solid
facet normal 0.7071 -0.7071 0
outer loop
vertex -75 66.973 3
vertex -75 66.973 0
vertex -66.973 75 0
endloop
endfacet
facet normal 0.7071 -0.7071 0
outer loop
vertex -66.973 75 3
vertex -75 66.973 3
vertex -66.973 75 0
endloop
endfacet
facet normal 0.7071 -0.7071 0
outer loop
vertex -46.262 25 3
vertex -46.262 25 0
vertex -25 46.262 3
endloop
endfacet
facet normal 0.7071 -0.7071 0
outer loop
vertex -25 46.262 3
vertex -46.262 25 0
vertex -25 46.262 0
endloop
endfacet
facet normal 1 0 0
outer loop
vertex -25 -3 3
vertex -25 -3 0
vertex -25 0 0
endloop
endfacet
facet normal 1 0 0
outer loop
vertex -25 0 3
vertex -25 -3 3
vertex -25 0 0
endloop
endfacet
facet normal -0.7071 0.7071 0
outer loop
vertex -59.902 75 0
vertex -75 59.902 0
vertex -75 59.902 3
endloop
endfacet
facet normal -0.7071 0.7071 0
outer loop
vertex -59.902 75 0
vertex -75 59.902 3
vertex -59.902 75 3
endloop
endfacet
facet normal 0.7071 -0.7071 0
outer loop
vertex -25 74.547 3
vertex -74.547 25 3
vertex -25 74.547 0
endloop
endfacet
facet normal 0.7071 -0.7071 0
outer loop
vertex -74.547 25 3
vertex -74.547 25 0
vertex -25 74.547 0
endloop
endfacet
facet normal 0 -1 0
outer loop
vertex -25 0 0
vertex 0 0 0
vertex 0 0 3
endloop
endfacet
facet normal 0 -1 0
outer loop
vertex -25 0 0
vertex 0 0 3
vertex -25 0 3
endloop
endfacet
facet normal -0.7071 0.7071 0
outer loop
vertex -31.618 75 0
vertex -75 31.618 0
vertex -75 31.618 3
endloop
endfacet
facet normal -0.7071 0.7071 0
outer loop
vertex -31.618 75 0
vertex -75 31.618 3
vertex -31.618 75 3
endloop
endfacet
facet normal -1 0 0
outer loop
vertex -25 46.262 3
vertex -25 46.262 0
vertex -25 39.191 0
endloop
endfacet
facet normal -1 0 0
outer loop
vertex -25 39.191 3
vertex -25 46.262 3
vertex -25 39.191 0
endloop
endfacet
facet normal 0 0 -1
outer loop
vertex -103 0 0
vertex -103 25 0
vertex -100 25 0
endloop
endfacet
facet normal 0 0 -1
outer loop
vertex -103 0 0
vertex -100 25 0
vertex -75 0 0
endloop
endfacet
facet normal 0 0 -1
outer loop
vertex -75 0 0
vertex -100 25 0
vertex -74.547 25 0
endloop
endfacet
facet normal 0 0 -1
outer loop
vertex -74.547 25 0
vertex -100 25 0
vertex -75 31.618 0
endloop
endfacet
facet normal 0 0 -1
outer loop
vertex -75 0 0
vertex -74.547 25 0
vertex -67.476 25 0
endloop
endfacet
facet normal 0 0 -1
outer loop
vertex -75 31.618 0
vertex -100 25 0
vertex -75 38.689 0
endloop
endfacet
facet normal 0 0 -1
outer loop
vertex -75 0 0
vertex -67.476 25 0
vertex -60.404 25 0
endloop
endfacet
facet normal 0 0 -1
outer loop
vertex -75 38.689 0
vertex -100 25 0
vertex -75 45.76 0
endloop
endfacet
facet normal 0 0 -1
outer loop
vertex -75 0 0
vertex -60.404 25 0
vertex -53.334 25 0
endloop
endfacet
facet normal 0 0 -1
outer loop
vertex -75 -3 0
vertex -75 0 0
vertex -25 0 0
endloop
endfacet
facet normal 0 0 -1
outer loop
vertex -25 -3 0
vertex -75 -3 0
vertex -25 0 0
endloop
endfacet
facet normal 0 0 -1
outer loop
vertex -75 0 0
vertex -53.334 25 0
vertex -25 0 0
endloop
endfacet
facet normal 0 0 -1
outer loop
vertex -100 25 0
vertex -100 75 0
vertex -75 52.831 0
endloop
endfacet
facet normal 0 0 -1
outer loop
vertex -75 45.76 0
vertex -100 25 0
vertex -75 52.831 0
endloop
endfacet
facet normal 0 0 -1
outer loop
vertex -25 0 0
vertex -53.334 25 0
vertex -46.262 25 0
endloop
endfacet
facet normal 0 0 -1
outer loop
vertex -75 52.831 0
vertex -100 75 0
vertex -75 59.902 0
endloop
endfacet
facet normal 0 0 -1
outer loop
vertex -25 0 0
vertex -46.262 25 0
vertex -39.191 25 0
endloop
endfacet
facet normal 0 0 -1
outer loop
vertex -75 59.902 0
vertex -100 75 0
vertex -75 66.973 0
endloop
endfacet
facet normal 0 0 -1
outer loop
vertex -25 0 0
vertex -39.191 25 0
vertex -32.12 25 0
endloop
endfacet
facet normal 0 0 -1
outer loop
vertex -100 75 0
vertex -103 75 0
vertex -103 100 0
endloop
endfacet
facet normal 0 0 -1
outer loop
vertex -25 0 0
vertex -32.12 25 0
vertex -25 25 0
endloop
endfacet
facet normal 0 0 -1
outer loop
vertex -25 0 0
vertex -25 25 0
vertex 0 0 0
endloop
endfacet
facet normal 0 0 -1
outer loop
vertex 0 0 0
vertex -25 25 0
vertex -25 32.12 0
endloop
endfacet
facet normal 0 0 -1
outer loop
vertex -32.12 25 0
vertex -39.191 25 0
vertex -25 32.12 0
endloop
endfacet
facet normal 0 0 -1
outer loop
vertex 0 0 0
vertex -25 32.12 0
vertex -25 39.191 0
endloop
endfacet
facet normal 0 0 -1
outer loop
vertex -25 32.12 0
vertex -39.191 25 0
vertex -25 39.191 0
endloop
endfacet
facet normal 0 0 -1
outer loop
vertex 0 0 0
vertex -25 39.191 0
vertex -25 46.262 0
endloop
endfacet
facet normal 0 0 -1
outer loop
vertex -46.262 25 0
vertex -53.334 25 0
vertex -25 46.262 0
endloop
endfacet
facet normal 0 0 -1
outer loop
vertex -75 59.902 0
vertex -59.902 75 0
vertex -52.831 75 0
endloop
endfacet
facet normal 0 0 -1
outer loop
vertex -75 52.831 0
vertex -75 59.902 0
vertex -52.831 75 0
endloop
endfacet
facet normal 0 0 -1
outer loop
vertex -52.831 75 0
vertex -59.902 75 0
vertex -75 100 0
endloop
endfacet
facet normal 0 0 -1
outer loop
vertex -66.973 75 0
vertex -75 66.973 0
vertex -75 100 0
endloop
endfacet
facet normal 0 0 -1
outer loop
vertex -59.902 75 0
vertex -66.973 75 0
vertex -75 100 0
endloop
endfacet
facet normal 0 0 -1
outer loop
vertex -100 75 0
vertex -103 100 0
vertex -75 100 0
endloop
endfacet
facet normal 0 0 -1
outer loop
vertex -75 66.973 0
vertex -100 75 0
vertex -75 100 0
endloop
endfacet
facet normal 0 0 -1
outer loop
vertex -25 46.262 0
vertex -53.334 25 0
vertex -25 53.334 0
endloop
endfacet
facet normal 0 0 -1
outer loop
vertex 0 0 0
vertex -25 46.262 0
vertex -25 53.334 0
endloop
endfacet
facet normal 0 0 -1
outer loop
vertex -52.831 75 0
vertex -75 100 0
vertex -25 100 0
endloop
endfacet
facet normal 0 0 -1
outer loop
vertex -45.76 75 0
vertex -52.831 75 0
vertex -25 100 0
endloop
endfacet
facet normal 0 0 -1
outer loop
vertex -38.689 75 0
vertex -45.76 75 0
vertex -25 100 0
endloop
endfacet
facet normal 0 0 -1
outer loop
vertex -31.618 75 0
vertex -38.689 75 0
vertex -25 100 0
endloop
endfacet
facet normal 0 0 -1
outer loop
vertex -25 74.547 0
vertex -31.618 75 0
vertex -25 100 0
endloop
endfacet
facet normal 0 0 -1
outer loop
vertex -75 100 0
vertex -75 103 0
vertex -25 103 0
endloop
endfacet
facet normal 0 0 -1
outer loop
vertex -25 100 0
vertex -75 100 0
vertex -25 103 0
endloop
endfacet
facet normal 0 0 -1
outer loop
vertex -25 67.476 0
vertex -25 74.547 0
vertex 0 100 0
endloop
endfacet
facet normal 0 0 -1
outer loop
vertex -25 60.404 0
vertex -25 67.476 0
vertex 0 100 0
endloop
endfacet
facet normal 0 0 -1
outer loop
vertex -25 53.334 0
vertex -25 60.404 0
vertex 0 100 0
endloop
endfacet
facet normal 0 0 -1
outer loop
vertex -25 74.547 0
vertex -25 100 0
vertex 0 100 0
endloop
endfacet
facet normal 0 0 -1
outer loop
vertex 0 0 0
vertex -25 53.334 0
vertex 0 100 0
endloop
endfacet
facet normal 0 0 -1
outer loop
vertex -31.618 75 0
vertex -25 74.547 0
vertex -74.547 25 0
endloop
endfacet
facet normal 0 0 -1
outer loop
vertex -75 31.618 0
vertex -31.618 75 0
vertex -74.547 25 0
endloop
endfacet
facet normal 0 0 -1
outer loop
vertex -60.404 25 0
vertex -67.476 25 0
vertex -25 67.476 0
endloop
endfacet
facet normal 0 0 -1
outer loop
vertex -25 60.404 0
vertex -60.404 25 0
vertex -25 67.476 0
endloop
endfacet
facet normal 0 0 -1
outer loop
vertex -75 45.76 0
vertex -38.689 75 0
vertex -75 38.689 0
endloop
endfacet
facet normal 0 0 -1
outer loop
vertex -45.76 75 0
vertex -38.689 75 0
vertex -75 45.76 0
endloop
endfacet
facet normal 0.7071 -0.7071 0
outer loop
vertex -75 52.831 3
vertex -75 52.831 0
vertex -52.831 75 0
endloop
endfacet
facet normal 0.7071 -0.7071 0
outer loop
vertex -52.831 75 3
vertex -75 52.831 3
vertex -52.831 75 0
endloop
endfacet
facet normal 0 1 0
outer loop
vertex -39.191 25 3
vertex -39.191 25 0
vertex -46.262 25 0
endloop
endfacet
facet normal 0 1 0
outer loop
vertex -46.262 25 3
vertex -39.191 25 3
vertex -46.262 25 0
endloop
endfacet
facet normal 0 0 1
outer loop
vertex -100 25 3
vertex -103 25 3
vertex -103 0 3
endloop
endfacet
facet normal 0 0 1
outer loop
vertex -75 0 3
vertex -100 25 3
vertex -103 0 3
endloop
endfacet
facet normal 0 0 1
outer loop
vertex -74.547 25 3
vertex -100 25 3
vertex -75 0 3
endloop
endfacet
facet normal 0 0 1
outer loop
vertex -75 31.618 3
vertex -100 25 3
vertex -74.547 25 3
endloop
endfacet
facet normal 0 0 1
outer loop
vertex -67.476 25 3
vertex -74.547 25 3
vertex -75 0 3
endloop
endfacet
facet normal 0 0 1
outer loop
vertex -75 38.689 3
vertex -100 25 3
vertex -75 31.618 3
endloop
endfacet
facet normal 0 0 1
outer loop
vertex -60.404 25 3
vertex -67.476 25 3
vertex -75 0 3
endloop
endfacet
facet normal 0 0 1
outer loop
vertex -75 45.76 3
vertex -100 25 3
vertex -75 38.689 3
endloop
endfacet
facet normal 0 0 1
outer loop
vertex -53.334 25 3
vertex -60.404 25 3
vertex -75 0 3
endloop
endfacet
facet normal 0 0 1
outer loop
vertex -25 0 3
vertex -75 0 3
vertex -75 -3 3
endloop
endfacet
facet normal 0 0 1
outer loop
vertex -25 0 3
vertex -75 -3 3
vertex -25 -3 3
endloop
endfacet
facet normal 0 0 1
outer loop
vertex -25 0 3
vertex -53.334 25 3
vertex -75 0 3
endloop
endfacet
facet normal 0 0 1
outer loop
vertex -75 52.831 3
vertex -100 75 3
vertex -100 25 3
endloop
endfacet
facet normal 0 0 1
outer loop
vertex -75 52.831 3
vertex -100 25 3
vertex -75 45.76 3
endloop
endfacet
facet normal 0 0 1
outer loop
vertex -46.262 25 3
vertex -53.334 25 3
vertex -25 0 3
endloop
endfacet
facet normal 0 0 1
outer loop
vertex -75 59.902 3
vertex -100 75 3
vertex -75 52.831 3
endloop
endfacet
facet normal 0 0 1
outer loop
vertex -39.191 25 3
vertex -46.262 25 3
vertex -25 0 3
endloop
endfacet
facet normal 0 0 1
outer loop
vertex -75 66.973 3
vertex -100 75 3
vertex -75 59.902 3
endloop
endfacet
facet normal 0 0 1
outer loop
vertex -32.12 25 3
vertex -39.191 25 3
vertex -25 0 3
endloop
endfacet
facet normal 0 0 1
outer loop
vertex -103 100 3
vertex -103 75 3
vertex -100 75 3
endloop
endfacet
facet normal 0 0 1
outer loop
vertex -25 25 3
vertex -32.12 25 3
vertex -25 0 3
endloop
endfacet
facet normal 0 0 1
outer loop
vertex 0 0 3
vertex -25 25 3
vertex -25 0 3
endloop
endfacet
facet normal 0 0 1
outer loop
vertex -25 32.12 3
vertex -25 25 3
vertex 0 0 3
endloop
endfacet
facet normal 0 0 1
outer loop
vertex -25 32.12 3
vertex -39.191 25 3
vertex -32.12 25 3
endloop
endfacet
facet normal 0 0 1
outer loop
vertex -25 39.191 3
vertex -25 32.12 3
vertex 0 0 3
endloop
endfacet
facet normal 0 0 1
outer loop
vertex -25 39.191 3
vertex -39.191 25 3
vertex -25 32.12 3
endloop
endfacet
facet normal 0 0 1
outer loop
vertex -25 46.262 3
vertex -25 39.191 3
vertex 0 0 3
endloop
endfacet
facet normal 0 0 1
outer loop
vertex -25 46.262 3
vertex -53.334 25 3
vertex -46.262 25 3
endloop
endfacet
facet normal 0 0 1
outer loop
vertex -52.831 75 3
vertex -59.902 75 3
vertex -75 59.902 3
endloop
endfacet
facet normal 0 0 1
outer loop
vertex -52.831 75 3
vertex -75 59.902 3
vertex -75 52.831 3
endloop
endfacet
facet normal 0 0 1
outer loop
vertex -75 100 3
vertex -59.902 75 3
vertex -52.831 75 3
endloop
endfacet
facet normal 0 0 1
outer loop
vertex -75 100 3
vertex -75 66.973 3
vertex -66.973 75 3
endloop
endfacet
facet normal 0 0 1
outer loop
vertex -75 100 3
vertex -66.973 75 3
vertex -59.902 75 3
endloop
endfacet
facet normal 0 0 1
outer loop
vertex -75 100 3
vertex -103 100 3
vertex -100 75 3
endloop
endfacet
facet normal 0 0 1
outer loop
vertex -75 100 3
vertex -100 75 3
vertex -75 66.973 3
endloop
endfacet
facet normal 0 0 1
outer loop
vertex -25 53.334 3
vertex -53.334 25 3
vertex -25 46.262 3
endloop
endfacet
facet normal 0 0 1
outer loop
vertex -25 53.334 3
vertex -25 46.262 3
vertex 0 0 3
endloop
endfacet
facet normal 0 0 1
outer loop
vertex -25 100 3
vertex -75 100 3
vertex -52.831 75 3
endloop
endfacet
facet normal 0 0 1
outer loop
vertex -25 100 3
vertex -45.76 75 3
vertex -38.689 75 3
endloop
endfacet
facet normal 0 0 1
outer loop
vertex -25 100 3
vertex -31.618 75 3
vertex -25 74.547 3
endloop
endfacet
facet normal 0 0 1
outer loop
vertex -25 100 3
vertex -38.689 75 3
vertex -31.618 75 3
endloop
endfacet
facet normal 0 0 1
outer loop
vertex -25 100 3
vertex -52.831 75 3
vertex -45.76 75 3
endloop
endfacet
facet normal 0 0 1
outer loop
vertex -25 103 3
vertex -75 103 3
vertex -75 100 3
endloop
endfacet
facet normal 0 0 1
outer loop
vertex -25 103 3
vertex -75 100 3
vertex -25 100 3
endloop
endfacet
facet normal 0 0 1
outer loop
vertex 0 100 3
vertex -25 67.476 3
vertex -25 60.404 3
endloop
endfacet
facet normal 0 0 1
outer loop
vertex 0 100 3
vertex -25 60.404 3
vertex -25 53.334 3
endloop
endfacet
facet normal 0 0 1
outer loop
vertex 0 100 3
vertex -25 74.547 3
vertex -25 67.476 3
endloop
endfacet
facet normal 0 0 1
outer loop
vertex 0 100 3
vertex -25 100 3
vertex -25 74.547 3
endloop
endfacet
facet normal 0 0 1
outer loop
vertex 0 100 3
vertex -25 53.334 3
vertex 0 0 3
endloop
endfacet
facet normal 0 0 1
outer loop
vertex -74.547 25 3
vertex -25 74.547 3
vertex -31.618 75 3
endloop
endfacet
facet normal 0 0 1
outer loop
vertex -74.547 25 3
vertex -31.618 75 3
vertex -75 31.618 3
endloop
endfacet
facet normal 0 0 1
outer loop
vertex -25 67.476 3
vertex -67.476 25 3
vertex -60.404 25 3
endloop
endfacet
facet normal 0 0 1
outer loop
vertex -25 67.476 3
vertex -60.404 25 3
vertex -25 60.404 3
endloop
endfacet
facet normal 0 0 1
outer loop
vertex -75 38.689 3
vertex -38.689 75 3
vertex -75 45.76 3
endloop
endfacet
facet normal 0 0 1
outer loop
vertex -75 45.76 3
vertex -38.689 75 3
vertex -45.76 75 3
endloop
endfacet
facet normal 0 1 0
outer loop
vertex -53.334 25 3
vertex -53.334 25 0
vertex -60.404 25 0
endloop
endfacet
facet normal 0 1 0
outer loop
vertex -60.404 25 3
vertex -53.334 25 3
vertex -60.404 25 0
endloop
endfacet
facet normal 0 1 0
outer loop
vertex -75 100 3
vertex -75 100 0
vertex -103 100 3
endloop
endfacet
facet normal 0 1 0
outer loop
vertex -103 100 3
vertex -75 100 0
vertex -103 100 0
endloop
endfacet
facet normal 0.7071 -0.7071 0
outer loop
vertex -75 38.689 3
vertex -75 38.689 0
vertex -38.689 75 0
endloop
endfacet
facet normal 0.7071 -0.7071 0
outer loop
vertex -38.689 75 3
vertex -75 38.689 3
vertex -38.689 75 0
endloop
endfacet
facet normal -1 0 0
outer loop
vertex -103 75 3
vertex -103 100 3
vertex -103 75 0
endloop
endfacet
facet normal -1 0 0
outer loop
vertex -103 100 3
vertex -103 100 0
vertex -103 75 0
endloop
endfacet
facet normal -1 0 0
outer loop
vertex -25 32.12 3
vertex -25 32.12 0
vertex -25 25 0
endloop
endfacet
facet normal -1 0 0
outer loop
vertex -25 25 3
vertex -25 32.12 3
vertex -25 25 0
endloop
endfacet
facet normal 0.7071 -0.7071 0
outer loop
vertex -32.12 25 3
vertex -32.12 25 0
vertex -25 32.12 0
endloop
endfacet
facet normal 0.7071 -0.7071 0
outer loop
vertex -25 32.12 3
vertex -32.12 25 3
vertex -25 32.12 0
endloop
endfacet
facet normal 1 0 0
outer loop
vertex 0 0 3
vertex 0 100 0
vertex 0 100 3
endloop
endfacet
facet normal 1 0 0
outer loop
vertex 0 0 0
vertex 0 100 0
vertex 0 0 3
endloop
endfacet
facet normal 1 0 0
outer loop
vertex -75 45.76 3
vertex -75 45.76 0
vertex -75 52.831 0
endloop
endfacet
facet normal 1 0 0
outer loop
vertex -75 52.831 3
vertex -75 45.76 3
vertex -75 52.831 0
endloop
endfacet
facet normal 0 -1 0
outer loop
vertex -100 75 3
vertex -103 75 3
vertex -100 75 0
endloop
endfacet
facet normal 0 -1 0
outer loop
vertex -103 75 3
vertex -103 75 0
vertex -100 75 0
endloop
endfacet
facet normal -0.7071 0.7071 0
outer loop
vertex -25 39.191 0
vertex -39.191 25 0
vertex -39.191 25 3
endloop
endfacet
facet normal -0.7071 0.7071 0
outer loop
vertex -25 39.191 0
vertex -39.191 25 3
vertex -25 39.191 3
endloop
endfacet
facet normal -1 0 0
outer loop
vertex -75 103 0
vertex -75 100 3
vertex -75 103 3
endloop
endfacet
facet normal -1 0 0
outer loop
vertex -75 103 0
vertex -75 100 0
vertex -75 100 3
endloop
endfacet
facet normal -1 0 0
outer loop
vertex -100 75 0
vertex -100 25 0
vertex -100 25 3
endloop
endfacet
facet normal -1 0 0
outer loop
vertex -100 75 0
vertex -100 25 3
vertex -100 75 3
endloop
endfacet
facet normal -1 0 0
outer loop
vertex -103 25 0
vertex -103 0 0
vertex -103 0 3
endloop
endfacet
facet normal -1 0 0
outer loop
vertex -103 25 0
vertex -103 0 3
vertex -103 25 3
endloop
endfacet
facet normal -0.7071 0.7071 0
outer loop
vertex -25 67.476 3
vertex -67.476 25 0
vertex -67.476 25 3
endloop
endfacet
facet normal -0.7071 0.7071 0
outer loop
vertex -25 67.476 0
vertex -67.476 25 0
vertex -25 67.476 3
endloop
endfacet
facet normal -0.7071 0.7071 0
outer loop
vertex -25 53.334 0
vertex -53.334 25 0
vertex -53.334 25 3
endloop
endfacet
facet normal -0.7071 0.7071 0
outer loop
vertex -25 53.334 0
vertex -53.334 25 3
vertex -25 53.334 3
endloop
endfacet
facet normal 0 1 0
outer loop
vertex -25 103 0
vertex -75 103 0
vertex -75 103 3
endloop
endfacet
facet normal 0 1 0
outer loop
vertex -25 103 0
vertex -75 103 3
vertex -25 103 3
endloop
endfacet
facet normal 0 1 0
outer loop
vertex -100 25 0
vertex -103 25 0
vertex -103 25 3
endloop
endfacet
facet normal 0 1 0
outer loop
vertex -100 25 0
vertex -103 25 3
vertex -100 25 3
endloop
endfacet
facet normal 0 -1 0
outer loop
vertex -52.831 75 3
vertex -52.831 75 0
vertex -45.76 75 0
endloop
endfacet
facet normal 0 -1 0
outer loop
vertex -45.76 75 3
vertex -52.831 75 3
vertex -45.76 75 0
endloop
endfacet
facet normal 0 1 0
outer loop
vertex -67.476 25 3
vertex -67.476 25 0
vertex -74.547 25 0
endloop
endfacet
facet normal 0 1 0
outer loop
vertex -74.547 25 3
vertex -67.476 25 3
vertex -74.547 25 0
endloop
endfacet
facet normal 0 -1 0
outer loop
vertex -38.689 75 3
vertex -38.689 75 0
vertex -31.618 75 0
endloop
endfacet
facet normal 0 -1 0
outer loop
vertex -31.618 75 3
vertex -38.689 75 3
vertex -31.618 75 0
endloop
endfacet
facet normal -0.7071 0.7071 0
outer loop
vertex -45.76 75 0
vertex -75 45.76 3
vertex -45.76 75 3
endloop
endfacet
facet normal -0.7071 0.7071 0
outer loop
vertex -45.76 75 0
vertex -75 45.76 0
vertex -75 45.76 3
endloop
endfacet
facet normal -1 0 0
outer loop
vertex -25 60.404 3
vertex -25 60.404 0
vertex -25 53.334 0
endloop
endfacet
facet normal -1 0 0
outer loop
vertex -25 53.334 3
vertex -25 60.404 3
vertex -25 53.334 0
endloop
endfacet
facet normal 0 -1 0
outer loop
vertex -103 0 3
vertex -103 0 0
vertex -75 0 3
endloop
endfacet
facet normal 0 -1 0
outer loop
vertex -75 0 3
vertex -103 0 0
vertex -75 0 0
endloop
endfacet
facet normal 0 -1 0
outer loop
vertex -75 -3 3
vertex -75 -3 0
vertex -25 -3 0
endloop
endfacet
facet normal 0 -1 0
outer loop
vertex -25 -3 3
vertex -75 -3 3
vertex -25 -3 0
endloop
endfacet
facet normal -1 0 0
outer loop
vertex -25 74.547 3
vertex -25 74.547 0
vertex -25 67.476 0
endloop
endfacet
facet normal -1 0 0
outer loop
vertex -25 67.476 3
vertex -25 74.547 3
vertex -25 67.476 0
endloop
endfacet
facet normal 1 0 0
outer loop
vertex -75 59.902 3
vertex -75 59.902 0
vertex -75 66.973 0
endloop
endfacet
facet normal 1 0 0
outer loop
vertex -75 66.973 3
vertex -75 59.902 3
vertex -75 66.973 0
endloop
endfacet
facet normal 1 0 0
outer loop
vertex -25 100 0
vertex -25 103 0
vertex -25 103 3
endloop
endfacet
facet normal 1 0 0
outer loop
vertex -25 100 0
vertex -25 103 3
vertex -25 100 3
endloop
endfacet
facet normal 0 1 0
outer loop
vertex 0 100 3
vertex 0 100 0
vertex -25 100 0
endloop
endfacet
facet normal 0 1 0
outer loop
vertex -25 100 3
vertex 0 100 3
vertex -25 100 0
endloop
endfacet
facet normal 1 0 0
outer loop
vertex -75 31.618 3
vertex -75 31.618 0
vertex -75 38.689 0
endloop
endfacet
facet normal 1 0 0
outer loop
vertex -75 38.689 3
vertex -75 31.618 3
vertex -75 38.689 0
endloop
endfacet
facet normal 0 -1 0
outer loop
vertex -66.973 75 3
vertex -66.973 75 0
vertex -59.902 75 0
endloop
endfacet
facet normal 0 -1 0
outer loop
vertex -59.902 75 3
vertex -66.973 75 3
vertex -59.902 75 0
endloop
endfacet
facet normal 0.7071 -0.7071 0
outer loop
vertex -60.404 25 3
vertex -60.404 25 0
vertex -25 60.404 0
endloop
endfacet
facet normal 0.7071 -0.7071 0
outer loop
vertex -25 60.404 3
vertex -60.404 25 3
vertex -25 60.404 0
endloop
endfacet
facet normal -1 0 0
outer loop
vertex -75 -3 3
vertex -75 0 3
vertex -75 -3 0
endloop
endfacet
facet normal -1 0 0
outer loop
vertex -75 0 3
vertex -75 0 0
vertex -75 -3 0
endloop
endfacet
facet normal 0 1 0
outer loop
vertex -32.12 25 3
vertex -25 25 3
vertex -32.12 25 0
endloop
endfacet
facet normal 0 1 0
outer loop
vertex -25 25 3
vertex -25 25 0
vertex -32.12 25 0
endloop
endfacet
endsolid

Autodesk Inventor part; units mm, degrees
ref_plane "YZ Plane" through (0, 0, 0) normal (1, 0, 0) x (0, 1, 0)
ref_plane "XZ Plane" through (0, 0, 0) normal (0, 1, 0) x (-1, 0, 0)
ref_plane "XY Plane" through (0, 0, 0) normal (0, 0, 1) x (1, 0, 0)
sketch "Boceto1" plane through (0, 0, 0) normal (0, 0, 1) x (1, 0, 0)
  line L0 (0, 100) -> (0, 0)
  line L1 (-100, 25) -> (-100, 75)
  line L2 (-75, 0) -> (-75, -3)
  line L3 (-75, -3) -> (-25, -3)
  line L4 (-25, -3) -> (-25, 0)
  line L5 (0, 0) -> (-25, 0)
  line L6 (-103, 100) -> (-103, 75)
  line L7 (-103, 75) -> (-100, 75)
  line L8 (-103, 0) -> (-103, 25)
  line L9 (-103, 25) -> (-100, 25)
  line L10 (-103, 0) -> (-75, 0)
  line L11 (-75, 100) -> (-75, 103)
  line L12 (-75, 103) -> (-25, 103)
  line L13 (-25, 103) -> (-25, 100)
  line L14 (0, 100) -> (-25, 100)
  line L15 (-75, 100) -> (-103, 100)
  line L16 (-75, 66.9731) -> (-66.9731, 75)
  line L17 (-75, 66.9731) -> (-63.6482, 66.9731) construction
  line L18 (-75, 59.902) -> (-59.902, 75)
  line L19 (-75, 52.8309) -> (-52.8309, 75)
  line L20 (-75, 45.7599) -> (-45.7599, 75)
  line L21 (-75, 38.6888) -> (-38.6888, 75)
  line L22 (-75, 31.6177) -> (-31.6177, 75)
  line L23 (-74.5467, 25) -> (-25, 74.5467)
  line L24 (-67.4756, 25) -> (-25, 67.4756)
  line L25 (-60.4045, 25) -> (-25, 60.4045)
  line L26 (-53.3335, 25) -> (-25, 53.3335)
  line L27 (-46.2624, 25) -> (-25, 46.2624)
  line L28 (-39.1913, 25) -> (-25, 39.1913)
  line L29 (-32.1203, 25) -> (-25, 32.1203)
  line L30 (-66.9731, 75) -> (-59.902, 75)
  line L31 (-75, 59.902) -> (-75, 66.9731)
  line L32 (-75, 31.6177) -> (-75, 38.6888)
  line L33 (-75, 45.7599) -> (-75, 52.8309)
  line L34 (-52.8309, 75) -> (-45.7599, 75)
  line L35 (-38.6888, 75) -> (-31.6177, 75)
  line L36 (-67.4756, 25) -> (-74.5467, 25)
  line L37 (-25, 74.5467) -> (-25, 67.4756)
  line L38 (-25, 60.4045) -> (-25, 53.3335)
  line L39 (-53.3335, 25) -> (-60.4045, 25)
  line L40 (-25, 25) -> (-32.1203, 25)
  line L41 (-39.1913, 25) -> (-46.2624, 25)
  line L42 (-25, 46.2624) -> (-25, 39.1913)
  line L43 (-25, 32.1203) -> (-25, 25)
  dimension "d1" = 100
  dimension "d4" = 50
  dimension "d5" = 25
  dimension "d7" = 25
  dimension "d8" = 25
  dimension "d9" = 3
  dimension "d10" = 3
  dimension "d11" = 100
  dimension "d13" = 50
  dimension "d14" = 3
  dimension "d15" = 45
  dimension "d16" = 5
  dimension "d17" = 5
  dimension "d18" = 5
  dimension "d19" = 5
  dimension "d20" = 5
  dimension "d21" = 5
  dimension "d22" = 5
  dimension "d25" = 5
  dimension "d26" = 5
  dimension "d27" = 5
  dimension "d28" = 5
  dimension "d29" = 5
  dimension "d30" = 25
  dimension "d31" = 25
  dimension "d32" = 11.3518
extrude "Extrusión1" add sketch "Boceto1" along normal blind 3
properties part number "Control lateral"
